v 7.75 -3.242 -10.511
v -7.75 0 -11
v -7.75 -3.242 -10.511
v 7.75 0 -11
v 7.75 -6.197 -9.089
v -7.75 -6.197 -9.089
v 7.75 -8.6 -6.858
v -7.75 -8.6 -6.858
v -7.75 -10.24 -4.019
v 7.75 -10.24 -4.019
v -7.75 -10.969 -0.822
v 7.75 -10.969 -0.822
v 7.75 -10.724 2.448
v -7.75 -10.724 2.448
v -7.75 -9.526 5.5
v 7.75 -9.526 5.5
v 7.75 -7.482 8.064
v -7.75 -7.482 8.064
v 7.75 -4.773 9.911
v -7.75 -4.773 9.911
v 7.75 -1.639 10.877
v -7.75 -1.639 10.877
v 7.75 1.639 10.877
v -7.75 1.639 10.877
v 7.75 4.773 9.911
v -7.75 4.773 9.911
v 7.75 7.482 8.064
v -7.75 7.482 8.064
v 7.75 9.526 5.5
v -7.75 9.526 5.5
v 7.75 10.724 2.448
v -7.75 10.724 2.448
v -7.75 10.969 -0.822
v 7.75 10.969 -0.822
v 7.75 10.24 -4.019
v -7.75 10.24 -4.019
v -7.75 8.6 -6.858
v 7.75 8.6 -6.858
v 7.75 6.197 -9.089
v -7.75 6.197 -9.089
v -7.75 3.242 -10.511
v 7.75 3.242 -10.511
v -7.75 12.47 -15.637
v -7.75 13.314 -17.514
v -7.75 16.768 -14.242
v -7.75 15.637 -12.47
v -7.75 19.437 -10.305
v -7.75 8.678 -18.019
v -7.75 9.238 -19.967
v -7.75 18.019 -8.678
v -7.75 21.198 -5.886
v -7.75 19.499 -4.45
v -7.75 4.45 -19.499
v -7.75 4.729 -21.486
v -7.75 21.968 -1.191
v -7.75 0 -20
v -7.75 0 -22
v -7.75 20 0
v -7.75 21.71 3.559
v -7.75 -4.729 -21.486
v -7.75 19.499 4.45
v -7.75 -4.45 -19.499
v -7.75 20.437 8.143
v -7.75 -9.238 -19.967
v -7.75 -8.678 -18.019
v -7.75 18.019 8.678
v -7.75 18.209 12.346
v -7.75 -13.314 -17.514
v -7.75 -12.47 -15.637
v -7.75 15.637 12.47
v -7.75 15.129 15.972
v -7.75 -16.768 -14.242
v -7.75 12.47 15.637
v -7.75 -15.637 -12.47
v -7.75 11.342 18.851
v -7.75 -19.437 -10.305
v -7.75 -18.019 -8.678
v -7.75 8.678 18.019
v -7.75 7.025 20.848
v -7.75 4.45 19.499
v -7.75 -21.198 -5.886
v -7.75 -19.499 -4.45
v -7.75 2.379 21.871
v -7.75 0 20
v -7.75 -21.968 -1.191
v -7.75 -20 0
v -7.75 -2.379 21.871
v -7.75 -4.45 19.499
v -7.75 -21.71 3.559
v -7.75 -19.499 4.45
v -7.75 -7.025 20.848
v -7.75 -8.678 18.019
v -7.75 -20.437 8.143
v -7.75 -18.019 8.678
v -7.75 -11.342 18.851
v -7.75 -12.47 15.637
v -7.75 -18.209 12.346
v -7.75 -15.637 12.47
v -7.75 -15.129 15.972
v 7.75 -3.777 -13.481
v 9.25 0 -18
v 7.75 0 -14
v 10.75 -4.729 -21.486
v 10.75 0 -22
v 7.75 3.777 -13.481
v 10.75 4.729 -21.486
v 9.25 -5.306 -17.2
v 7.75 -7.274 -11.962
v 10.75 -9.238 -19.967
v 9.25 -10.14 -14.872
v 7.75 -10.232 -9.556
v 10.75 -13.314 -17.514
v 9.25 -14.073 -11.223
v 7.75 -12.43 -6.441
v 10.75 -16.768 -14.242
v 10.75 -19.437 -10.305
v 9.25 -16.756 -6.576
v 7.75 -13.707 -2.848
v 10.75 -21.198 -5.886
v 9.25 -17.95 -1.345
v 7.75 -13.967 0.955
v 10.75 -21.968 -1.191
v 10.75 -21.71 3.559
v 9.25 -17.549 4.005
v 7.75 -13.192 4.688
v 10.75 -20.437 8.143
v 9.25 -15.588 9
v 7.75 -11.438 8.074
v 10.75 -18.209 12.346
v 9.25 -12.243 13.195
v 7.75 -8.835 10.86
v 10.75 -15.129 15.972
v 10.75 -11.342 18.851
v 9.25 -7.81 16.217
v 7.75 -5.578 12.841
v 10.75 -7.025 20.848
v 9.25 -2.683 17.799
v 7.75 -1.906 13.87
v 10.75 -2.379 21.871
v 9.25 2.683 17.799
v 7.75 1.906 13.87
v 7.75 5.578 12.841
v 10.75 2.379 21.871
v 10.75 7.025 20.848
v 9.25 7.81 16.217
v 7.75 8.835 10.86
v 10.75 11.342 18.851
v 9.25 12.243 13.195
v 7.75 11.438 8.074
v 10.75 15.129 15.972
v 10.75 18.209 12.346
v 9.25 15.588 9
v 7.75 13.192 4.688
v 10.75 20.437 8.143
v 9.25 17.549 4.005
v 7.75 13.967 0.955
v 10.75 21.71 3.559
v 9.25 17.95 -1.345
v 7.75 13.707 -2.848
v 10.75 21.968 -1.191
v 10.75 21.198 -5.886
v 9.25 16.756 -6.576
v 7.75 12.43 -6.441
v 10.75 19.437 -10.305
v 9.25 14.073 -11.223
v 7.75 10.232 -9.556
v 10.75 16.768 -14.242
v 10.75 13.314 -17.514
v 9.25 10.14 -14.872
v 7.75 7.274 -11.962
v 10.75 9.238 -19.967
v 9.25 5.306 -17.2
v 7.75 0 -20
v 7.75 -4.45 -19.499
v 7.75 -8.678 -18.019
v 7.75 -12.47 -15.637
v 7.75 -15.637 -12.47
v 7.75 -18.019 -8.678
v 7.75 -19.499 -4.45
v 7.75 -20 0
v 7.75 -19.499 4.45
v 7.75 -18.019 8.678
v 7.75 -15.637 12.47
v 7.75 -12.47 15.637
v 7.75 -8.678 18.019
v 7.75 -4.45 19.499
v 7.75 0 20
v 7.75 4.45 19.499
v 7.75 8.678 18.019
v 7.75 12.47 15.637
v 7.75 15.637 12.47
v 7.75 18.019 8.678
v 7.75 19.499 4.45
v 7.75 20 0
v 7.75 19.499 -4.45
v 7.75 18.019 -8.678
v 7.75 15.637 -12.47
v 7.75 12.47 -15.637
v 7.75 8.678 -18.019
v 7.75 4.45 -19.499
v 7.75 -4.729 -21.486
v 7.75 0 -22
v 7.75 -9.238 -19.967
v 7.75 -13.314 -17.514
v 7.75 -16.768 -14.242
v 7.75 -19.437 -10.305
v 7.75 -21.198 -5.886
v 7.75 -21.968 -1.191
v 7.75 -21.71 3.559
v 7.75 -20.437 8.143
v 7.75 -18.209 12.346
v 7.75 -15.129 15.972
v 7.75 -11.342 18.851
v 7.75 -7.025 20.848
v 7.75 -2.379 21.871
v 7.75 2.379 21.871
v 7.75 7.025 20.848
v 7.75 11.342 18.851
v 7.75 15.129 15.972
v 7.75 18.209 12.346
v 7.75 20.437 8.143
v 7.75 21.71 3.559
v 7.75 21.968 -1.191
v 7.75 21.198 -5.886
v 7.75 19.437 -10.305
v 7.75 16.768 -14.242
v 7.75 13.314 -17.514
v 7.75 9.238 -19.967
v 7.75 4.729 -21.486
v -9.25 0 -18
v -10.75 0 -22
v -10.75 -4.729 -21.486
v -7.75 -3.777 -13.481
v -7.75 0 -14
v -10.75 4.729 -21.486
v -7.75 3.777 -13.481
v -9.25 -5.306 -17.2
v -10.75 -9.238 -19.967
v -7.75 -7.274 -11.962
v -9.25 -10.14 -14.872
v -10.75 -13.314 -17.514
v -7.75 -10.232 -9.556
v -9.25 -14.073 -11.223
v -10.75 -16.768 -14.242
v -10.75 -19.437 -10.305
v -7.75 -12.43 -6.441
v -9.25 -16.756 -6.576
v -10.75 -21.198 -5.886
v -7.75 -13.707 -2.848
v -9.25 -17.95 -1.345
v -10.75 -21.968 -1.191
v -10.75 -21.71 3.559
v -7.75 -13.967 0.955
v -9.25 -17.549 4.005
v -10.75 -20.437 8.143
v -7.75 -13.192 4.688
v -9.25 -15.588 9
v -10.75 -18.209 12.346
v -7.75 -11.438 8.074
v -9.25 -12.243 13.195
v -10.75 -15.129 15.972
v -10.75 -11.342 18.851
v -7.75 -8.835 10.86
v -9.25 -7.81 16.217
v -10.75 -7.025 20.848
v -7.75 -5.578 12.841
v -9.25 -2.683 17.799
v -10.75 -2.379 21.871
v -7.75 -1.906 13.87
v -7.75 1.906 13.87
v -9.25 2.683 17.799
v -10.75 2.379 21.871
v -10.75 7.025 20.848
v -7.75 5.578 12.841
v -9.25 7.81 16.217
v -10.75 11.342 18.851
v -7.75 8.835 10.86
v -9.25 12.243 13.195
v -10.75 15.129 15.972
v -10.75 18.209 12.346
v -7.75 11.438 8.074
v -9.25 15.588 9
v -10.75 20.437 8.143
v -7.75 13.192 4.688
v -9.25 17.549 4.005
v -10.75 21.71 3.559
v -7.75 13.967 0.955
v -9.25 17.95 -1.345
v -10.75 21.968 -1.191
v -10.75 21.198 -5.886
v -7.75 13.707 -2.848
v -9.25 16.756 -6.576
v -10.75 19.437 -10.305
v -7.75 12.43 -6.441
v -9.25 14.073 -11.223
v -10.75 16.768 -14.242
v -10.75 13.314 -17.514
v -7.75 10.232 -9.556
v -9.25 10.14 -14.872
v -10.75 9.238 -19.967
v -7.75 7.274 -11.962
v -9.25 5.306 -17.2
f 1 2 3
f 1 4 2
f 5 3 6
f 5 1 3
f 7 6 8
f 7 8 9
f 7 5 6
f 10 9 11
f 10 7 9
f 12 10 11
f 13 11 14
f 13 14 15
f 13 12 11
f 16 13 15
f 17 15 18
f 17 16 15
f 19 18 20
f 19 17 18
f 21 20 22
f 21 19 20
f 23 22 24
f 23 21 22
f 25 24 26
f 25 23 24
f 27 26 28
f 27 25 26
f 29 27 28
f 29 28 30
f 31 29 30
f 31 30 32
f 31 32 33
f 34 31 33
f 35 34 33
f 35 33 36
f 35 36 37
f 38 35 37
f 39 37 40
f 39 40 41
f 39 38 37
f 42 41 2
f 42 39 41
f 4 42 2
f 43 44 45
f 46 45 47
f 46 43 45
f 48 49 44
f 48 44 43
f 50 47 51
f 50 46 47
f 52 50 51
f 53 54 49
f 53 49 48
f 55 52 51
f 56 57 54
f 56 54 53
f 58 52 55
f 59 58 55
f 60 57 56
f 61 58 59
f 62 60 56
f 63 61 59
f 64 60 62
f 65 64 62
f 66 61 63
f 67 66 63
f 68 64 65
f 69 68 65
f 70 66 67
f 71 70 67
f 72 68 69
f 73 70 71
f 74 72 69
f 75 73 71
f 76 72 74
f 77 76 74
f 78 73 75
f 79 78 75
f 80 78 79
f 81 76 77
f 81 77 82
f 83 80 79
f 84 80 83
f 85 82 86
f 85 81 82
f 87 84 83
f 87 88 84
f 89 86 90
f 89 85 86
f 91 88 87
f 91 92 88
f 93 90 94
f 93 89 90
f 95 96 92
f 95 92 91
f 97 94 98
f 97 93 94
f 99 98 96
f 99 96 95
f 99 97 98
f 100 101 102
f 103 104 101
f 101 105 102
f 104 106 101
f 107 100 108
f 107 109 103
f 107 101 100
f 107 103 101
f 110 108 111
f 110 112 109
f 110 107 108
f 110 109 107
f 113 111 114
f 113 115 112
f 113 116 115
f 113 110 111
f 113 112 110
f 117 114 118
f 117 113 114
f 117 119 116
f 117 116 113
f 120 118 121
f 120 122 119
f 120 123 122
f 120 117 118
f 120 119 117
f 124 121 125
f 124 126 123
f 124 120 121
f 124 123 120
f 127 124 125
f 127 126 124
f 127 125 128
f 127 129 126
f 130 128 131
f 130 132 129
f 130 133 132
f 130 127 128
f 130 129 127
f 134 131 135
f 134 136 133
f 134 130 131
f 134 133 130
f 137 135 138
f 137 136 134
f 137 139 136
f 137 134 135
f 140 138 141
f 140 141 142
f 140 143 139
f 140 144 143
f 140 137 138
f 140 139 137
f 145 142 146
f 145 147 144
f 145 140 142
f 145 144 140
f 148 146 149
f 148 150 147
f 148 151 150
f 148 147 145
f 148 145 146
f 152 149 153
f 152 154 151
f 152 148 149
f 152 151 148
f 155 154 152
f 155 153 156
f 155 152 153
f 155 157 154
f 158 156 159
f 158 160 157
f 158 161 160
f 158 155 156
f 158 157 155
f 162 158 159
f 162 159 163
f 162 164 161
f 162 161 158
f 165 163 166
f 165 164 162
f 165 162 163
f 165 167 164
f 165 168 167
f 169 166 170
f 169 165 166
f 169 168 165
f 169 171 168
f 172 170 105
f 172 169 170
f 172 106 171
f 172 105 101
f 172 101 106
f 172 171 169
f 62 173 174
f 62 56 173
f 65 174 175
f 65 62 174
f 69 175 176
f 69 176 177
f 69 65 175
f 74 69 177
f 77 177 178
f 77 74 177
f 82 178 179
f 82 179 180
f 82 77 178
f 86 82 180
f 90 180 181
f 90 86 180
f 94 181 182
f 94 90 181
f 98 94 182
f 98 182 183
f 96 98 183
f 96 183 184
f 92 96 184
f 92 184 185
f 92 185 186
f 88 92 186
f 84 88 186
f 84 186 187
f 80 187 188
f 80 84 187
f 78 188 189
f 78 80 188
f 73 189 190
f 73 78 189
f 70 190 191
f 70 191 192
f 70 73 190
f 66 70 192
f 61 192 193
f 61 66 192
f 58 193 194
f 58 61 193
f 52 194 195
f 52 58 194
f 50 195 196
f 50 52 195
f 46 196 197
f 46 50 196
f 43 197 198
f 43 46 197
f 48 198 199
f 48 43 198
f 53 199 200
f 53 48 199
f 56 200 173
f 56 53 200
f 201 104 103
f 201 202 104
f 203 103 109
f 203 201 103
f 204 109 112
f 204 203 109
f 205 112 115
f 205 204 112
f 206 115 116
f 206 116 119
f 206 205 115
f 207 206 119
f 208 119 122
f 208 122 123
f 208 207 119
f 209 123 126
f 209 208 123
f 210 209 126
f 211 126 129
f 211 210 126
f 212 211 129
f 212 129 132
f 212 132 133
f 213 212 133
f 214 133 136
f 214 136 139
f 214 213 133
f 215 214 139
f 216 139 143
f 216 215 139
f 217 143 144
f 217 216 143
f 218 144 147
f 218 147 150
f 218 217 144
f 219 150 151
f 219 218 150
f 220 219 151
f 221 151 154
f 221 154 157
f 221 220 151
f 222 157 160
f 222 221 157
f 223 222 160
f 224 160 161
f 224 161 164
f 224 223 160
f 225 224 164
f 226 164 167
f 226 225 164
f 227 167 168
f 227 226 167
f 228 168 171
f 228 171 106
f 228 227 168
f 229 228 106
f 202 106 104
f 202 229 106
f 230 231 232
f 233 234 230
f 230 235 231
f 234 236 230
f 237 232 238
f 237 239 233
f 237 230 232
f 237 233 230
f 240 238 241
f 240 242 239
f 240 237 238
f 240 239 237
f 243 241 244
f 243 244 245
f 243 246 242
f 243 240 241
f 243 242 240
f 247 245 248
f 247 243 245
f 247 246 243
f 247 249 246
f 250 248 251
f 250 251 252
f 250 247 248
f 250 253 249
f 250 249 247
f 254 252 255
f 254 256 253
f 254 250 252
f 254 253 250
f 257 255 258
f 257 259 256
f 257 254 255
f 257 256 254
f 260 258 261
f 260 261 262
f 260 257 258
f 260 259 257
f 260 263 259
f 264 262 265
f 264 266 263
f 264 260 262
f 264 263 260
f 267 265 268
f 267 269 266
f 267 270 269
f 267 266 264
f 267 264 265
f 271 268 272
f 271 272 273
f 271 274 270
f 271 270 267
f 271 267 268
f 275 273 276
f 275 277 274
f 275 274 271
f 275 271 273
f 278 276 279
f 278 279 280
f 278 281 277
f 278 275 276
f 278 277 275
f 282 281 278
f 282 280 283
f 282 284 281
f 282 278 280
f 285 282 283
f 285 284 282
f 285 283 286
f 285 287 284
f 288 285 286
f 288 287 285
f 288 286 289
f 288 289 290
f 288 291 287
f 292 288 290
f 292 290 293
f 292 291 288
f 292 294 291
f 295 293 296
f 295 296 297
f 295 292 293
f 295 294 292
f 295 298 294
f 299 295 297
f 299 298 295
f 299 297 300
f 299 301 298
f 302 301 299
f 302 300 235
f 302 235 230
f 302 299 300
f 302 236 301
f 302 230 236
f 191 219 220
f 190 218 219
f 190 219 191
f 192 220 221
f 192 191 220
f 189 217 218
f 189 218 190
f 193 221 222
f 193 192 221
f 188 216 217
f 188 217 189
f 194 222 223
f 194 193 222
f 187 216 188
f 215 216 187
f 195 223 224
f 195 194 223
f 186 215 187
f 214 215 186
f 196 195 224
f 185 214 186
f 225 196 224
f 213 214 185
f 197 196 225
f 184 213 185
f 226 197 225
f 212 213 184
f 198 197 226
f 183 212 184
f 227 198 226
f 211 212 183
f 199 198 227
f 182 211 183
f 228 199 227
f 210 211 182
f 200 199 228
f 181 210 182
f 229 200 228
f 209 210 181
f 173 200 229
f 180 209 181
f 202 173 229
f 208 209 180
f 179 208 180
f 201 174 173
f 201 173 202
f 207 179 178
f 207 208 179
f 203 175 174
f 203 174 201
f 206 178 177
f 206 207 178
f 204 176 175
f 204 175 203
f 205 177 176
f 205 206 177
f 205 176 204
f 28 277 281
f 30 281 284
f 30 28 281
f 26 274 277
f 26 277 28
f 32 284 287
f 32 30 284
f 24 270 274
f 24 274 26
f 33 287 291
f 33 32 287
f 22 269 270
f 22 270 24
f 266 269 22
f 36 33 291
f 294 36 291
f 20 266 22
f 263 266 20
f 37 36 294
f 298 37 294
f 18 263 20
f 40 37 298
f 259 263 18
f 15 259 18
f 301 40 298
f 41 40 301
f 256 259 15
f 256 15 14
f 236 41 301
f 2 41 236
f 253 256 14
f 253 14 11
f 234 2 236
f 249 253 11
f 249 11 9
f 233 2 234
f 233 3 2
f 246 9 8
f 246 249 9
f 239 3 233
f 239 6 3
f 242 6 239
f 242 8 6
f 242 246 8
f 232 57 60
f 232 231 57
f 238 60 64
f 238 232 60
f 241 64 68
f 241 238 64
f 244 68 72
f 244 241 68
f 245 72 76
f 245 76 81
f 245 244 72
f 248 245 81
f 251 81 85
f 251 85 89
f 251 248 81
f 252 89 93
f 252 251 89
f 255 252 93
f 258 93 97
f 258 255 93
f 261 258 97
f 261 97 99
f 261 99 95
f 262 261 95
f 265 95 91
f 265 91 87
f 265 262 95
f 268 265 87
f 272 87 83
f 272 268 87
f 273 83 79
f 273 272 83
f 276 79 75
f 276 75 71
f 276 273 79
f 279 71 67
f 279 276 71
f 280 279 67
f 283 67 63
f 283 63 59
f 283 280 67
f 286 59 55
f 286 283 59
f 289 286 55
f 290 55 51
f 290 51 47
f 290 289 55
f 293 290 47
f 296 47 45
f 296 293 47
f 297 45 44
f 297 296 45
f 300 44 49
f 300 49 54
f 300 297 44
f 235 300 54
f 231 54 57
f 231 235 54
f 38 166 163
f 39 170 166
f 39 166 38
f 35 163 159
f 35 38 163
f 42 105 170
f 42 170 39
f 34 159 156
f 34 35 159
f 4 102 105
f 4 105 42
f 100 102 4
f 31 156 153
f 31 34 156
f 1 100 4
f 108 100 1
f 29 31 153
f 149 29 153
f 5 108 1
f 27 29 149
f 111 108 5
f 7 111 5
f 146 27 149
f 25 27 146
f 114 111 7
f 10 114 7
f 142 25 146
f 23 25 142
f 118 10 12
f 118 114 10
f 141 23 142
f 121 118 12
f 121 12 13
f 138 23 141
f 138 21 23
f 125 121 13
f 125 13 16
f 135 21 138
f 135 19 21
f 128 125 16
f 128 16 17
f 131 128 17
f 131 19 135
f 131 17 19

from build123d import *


with BuildPart() as part:
    # Sketch2 → Revolve1 (revolve)
    with BuildSketch(Plane.XY, mode=Mode.PRIVATE) as revolve1_sk:
        Polygon((-7.75, 11), (0, 11), (0, 20), (-7.75, 20), (-7.75, 14), align=None)
        Polygon((-7.75, 14), (-7.75, 20), (-7.75, 22), (-10.75, 22), align=None)
        Polygon((0, 20), (0, 11), (7.75, 11), (7.75, 14), (7.75, 20), align=None)
        Polygon((7.75, 22), (7.75, 20), (7.75, 14), (10.75, 22), align=None)
    revolve(revolve1_sk.sketch.rotate(Axis((11.825, 0, 0), (-1, 0, 0)), 90), axis=Axis((11.825, 0, 0), (-1, 0, 0)))


solid = part.part
